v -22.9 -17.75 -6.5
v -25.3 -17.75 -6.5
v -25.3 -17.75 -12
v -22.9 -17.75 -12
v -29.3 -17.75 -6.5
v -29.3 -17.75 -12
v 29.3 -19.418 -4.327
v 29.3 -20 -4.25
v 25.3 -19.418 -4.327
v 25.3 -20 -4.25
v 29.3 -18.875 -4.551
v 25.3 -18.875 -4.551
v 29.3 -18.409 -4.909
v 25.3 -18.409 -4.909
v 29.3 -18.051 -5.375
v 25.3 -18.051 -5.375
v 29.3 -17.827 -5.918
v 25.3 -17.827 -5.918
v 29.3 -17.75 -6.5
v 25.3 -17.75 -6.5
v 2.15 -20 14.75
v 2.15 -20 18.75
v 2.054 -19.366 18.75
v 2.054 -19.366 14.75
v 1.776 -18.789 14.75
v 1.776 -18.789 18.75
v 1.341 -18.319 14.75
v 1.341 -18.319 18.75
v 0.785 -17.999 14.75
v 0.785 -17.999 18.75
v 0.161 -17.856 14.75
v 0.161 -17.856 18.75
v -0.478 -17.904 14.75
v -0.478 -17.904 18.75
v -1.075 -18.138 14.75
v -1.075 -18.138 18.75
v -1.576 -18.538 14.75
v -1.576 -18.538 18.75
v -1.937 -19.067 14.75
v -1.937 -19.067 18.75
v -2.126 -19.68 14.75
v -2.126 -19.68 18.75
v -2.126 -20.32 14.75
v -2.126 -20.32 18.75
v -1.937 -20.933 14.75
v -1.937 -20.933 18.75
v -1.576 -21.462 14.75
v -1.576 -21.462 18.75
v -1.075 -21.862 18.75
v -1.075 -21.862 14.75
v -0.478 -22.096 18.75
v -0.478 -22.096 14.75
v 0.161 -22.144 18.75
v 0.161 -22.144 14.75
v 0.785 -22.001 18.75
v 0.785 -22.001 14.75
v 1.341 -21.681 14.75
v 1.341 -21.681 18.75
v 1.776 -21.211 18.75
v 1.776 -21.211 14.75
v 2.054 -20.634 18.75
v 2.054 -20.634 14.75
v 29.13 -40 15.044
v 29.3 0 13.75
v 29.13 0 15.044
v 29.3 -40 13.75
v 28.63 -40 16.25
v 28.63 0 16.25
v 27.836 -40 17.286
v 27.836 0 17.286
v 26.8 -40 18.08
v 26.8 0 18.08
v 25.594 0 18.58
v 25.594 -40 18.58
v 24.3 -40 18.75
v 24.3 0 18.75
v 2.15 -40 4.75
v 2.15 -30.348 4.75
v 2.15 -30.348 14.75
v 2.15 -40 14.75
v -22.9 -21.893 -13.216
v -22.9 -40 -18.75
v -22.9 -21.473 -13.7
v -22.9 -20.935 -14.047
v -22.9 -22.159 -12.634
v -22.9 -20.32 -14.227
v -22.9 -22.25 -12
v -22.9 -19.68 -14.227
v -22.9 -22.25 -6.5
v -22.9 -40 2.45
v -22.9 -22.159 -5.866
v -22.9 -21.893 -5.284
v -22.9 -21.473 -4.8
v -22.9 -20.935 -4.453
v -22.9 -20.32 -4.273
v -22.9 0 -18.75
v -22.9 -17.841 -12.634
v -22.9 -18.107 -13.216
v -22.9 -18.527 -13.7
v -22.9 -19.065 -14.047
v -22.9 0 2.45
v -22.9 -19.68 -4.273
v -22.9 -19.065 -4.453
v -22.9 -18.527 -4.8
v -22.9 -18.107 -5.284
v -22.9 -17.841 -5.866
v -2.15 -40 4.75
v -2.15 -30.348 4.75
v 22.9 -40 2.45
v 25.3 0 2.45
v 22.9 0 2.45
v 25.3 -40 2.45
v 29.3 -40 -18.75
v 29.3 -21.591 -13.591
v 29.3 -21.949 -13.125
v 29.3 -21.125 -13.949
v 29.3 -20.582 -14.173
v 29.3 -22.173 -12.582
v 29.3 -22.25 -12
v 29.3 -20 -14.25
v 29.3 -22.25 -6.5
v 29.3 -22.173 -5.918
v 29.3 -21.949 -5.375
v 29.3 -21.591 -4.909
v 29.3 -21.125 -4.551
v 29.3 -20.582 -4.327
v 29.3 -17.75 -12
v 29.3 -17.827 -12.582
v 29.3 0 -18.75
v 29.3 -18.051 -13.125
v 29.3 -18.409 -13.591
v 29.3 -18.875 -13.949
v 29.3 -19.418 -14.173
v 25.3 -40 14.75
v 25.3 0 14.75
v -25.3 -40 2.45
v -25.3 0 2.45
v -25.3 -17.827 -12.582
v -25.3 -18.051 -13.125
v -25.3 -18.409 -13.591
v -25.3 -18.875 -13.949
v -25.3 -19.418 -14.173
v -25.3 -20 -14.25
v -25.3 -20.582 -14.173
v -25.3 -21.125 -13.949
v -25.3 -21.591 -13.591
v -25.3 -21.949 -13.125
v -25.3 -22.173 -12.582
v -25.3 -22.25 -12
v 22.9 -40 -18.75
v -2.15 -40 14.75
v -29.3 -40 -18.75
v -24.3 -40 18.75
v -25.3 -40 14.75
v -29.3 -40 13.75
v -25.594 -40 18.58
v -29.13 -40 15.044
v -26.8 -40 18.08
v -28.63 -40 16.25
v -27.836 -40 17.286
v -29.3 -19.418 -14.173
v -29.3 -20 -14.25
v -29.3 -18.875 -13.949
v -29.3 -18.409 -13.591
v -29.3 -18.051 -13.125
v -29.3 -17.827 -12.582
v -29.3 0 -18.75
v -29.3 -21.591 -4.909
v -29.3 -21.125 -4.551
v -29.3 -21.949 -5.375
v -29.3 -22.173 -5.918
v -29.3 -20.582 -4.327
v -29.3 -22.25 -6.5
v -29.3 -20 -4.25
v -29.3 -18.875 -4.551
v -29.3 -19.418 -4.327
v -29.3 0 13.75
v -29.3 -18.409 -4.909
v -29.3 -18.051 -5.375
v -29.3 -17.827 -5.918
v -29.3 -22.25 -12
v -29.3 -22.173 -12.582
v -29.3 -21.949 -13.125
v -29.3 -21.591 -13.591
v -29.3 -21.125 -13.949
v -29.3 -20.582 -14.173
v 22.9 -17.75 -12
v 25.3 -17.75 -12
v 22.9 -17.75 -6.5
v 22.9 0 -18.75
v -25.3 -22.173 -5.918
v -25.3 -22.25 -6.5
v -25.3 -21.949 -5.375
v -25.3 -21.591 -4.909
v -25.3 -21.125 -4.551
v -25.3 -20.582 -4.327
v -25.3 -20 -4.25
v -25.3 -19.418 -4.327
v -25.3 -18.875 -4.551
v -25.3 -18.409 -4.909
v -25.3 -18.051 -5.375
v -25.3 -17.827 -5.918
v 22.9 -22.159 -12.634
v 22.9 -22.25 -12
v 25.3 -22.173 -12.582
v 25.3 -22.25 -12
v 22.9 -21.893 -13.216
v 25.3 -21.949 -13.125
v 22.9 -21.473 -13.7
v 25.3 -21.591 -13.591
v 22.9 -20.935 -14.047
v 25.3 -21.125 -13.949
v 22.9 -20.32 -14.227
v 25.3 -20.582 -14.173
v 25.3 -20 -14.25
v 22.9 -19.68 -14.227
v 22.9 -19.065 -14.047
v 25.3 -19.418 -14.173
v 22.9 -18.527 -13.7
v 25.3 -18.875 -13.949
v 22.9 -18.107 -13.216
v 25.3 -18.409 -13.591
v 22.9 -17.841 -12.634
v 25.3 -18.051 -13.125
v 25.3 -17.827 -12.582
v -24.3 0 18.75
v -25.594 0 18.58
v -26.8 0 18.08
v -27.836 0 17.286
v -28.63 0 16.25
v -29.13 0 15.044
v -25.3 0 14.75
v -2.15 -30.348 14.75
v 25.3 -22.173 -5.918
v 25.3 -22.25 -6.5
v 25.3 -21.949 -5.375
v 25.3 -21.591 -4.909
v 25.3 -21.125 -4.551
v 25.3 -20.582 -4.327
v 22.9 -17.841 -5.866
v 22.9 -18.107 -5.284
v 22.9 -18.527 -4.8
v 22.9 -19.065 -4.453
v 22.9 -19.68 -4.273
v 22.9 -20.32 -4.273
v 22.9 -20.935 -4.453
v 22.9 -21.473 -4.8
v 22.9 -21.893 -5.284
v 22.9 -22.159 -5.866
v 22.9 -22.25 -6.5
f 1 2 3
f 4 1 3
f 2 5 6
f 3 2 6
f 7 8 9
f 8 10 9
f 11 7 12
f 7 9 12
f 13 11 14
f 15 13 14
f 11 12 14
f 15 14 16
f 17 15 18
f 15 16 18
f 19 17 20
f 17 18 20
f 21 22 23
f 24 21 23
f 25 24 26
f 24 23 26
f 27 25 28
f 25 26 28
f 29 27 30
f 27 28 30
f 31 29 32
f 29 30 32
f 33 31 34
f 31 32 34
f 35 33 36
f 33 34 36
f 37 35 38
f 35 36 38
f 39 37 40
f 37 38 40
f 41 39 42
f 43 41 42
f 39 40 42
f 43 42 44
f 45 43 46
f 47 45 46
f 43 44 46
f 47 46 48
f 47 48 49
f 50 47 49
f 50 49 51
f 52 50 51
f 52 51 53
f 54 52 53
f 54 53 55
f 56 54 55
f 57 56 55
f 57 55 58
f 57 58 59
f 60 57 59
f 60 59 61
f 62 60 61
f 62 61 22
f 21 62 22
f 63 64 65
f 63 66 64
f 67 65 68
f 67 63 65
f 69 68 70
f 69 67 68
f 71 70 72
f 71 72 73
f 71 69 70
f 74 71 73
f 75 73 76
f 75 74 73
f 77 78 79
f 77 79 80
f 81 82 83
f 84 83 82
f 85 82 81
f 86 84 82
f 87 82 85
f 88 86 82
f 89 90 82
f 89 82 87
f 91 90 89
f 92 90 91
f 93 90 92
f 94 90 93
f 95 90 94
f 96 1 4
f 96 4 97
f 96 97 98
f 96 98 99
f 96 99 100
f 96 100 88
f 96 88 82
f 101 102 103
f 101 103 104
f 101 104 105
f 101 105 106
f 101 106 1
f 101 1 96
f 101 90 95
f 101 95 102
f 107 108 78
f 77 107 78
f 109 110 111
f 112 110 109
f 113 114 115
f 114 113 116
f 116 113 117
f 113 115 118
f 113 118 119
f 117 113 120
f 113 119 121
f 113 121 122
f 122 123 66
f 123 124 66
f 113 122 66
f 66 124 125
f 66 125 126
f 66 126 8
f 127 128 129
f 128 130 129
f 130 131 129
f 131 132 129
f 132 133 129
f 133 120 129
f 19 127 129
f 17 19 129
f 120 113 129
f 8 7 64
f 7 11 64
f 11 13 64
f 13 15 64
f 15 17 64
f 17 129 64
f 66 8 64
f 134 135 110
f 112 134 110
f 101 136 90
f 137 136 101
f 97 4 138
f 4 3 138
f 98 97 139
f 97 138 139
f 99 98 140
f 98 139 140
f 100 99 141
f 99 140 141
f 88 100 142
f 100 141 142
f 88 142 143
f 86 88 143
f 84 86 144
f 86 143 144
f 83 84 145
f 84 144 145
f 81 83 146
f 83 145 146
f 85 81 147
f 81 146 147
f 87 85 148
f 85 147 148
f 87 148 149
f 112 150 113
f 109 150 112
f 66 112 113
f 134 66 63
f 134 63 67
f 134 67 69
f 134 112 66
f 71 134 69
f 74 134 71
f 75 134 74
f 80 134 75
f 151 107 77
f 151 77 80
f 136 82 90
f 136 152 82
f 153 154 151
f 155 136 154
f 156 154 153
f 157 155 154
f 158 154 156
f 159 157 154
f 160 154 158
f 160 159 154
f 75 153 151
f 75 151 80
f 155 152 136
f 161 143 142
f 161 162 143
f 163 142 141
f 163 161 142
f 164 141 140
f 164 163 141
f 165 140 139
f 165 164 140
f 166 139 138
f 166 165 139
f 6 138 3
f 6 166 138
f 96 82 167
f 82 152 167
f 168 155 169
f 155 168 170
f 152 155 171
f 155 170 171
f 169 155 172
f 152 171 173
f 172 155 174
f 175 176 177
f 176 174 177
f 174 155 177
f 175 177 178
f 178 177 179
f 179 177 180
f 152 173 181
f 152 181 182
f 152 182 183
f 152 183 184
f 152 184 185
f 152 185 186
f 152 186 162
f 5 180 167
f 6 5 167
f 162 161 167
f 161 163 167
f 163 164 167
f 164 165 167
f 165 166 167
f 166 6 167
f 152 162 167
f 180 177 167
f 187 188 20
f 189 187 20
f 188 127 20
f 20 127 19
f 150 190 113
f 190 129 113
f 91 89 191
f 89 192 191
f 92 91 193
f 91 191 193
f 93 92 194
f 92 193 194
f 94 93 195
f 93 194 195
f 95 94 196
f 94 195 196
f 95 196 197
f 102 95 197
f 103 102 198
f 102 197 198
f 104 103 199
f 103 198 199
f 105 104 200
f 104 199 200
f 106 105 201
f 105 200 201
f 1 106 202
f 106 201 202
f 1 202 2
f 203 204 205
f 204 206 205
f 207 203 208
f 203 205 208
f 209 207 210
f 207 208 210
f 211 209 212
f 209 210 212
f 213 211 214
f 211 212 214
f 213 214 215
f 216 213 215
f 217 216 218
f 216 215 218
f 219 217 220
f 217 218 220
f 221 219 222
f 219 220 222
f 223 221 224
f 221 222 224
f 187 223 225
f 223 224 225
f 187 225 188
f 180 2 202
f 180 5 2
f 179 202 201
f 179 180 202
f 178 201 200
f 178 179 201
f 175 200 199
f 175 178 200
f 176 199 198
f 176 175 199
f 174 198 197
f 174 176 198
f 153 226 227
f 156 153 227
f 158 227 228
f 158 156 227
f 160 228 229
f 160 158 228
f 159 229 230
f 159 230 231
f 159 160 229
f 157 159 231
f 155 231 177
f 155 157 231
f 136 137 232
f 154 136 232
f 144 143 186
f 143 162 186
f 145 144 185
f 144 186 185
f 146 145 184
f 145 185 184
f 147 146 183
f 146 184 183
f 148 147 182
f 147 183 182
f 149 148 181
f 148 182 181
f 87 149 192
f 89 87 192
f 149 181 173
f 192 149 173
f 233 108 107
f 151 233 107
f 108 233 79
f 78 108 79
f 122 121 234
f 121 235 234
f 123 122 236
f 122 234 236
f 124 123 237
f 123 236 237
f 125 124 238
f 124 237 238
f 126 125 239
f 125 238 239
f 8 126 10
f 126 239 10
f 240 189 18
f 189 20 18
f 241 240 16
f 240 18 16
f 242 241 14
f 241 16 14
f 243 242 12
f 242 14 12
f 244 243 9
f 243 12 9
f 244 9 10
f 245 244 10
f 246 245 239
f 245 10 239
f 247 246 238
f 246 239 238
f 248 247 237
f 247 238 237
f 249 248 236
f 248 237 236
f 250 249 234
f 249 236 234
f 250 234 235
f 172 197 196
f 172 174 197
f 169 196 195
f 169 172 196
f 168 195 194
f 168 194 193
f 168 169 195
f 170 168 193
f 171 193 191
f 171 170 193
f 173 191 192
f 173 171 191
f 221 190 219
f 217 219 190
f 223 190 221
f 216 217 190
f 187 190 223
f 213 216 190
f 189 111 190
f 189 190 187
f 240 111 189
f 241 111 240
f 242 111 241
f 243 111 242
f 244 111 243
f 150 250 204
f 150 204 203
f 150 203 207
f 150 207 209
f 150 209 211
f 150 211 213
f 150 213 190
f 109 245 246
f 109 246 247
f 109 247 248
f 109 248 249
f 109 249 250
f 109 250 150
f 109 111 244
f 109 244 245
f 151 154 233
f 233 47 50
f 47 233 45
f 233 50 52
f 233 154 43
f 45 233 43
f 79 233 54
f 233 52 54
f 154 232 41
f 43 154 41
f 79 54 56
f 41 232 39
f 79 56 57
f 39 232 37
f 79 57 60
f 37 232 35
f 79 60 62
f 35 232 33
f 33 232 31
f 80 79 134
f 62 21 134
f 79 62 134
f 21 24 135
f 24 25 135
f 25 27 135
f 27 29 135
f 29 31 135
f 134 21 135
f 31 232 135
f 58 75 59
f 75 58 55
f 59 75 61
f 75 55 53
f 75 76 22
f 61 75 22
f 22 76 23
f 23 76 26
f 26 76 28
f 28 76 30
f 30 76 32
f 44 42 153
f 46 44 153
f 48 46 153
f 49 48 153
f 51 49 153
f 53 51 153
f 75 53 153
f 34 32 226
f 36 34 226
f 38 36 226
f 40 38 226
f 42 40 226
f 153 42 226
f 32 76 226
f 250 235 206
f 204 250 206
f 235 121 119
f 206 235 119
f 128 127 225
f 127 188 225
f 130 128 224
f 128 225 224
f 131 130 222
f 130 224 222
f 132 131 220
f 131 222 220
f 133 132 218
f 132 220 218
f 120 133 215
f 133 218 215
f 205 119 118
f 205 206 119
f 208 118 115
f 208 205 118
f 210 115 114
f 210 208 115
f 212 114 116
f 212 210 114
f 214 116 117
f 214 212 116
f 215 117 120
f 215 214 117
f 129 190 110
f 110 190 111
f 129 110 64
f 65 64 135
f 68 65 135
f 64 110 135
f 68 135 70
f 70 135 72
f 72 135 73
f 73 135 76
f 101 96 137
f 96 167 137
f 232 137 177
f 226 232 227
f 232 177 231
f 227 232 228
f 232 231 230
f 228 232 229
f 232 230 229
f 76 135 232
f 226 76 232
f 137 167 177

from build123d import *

# Parameters (mm, degrees)
F1_DEPTH  = 40
F2_R      = 5
F3_R      = 2.15
F4_DEPTH  = 25
F5_W      = 4.5
F5_H      = 10
F6_DEPTH  = 58.601
F7_R      = 2.24999
F8_W      = 40
F8_H      = 21.2
F9_DEPTH  = 2.4
F10_W     = 40
F10_H     = 21.2
F11_DEPTH = 2.4
F12_W     = 4.3
F12_H     = 9.6518629789
F13_DEPTH = 10


# Not quite as in the source:
# - a fillet or chamfer is up to 0.001 mm smaller than in the source, because OpenCascade refuses the exact size


with BuildPart() as f1:
    # F0 (on Front) → F1 (new body)
    with BuildSketch(Plane.XZ):
        Polygon((25.3, -18.75), (29.3, -18.75), (29.3, 18.75), (-29.3, 18.75), (-29.3, -18.75), (-25.3, -18.75), (-25.3, 14.75), (25.3, 14.75), align=None)
    extrude(amount=F1_DEPTH)

    # F2
    f2_edges = [f1.edges().sort_by_distance(p)[0] for p in [
        (-29.3, -20, 18.75),
        (29.3, -20, 18.75),
    ]]
    fillet(f2_edges, radius=F2_R)

    # F3 (on face) → F4 (cut)
    with BuildSketch(Plane.XY.offset(18.75)):
        with Locations((0, -20)):
            Circle(F3_R)
    extrude(amount=-F4_DEPTH, mode=Mode.SUBTRACT)

    # F5 (on face) → F6 (cut, through all)
    with BuildSketch(Plane.YZ.offset(29.3)):
        with Locations((-20, -9.25)):
            Rectangle(F5_W, F5_H)
    extrude(amount=-F6_DEPTH, mode=Mode.SUBTRACT)

    # F7 (radius 2.25 in the source; OpenCascade refuses exactly that, so slightly less here)
    f7_edges = [f1.edges().sort_by_distance(p)[0] for p in [
        (27.3, -17.75, -4.25),
        (27.3, -22.25, -4.25),
        (27.3, -17.75, -14.25),
        (27.3, -22.25, -14.25),
        (-27.3, -17.75, -4.25),
        (-27.3, -17.75, -14.25),
        (-27.3, -22.25, -4.25),
        (-27.3, -22.25, -14.25),
    ]]
    fillet(f7_edges, radius=F7_R)

    # F8 (on face) → F9 (join)
    with BuildSketch(Plane(origin=(25.3, 0, 0), x_dir=(0, -1, 0), z_dir=(-1, 0, 0))):
        with Locations((20, -8.15)):
            Rectangle(F8_W, F8_H)
        with BuildLine():
            ThreePointArc((17.75, -6.5), (20, -4.25), (22.25, -6.5))
            Line((22.25, -6.5), (22.25, -12))
            ThreePointArc((22.25, -12), (20, -14.25), (17.75, -12))
            Line((17.75, -12), (17.75, -6.5))
        make_face(mode=Mode.SUBTRACT)
    extrude(amount=F9_DEPTH)

    # F10 (on face) → F11 (join)
    with BuildSketch(Plane.YZ.offset(-25.3)):
        with Locations((-20, -8.15)):
            Rectangle(F10_W, F10_H)
        with BuildLine():
            ThreePointArc((-22.25, -6.5), (-20, -4.25), (-17.75, -6.5))
            Line((-17.75, -6.5), (-17.75, -12))
            ThreePointArc((-17.75, -12), (-20, -14.25), (-22.25, -12))
            Line((-22.25, -12), (-22.25, -6.5))
        make_face(mode=Mode.SUBTRACT)
    extrude(amount=F11_DEPTH)

    # F12 (on face) → F13 (join)
    with BuildSketch(Plane(origin=(0, 0, 14.75), x_dir=(1, 0, 0), z_dir=(0, 0, -1))):
        with Locations((0, 35.1740685105)):
            Rectangle(F12_W, F12_H)
    extrude(amount=F13_DEPTH)


solid = f1.part
